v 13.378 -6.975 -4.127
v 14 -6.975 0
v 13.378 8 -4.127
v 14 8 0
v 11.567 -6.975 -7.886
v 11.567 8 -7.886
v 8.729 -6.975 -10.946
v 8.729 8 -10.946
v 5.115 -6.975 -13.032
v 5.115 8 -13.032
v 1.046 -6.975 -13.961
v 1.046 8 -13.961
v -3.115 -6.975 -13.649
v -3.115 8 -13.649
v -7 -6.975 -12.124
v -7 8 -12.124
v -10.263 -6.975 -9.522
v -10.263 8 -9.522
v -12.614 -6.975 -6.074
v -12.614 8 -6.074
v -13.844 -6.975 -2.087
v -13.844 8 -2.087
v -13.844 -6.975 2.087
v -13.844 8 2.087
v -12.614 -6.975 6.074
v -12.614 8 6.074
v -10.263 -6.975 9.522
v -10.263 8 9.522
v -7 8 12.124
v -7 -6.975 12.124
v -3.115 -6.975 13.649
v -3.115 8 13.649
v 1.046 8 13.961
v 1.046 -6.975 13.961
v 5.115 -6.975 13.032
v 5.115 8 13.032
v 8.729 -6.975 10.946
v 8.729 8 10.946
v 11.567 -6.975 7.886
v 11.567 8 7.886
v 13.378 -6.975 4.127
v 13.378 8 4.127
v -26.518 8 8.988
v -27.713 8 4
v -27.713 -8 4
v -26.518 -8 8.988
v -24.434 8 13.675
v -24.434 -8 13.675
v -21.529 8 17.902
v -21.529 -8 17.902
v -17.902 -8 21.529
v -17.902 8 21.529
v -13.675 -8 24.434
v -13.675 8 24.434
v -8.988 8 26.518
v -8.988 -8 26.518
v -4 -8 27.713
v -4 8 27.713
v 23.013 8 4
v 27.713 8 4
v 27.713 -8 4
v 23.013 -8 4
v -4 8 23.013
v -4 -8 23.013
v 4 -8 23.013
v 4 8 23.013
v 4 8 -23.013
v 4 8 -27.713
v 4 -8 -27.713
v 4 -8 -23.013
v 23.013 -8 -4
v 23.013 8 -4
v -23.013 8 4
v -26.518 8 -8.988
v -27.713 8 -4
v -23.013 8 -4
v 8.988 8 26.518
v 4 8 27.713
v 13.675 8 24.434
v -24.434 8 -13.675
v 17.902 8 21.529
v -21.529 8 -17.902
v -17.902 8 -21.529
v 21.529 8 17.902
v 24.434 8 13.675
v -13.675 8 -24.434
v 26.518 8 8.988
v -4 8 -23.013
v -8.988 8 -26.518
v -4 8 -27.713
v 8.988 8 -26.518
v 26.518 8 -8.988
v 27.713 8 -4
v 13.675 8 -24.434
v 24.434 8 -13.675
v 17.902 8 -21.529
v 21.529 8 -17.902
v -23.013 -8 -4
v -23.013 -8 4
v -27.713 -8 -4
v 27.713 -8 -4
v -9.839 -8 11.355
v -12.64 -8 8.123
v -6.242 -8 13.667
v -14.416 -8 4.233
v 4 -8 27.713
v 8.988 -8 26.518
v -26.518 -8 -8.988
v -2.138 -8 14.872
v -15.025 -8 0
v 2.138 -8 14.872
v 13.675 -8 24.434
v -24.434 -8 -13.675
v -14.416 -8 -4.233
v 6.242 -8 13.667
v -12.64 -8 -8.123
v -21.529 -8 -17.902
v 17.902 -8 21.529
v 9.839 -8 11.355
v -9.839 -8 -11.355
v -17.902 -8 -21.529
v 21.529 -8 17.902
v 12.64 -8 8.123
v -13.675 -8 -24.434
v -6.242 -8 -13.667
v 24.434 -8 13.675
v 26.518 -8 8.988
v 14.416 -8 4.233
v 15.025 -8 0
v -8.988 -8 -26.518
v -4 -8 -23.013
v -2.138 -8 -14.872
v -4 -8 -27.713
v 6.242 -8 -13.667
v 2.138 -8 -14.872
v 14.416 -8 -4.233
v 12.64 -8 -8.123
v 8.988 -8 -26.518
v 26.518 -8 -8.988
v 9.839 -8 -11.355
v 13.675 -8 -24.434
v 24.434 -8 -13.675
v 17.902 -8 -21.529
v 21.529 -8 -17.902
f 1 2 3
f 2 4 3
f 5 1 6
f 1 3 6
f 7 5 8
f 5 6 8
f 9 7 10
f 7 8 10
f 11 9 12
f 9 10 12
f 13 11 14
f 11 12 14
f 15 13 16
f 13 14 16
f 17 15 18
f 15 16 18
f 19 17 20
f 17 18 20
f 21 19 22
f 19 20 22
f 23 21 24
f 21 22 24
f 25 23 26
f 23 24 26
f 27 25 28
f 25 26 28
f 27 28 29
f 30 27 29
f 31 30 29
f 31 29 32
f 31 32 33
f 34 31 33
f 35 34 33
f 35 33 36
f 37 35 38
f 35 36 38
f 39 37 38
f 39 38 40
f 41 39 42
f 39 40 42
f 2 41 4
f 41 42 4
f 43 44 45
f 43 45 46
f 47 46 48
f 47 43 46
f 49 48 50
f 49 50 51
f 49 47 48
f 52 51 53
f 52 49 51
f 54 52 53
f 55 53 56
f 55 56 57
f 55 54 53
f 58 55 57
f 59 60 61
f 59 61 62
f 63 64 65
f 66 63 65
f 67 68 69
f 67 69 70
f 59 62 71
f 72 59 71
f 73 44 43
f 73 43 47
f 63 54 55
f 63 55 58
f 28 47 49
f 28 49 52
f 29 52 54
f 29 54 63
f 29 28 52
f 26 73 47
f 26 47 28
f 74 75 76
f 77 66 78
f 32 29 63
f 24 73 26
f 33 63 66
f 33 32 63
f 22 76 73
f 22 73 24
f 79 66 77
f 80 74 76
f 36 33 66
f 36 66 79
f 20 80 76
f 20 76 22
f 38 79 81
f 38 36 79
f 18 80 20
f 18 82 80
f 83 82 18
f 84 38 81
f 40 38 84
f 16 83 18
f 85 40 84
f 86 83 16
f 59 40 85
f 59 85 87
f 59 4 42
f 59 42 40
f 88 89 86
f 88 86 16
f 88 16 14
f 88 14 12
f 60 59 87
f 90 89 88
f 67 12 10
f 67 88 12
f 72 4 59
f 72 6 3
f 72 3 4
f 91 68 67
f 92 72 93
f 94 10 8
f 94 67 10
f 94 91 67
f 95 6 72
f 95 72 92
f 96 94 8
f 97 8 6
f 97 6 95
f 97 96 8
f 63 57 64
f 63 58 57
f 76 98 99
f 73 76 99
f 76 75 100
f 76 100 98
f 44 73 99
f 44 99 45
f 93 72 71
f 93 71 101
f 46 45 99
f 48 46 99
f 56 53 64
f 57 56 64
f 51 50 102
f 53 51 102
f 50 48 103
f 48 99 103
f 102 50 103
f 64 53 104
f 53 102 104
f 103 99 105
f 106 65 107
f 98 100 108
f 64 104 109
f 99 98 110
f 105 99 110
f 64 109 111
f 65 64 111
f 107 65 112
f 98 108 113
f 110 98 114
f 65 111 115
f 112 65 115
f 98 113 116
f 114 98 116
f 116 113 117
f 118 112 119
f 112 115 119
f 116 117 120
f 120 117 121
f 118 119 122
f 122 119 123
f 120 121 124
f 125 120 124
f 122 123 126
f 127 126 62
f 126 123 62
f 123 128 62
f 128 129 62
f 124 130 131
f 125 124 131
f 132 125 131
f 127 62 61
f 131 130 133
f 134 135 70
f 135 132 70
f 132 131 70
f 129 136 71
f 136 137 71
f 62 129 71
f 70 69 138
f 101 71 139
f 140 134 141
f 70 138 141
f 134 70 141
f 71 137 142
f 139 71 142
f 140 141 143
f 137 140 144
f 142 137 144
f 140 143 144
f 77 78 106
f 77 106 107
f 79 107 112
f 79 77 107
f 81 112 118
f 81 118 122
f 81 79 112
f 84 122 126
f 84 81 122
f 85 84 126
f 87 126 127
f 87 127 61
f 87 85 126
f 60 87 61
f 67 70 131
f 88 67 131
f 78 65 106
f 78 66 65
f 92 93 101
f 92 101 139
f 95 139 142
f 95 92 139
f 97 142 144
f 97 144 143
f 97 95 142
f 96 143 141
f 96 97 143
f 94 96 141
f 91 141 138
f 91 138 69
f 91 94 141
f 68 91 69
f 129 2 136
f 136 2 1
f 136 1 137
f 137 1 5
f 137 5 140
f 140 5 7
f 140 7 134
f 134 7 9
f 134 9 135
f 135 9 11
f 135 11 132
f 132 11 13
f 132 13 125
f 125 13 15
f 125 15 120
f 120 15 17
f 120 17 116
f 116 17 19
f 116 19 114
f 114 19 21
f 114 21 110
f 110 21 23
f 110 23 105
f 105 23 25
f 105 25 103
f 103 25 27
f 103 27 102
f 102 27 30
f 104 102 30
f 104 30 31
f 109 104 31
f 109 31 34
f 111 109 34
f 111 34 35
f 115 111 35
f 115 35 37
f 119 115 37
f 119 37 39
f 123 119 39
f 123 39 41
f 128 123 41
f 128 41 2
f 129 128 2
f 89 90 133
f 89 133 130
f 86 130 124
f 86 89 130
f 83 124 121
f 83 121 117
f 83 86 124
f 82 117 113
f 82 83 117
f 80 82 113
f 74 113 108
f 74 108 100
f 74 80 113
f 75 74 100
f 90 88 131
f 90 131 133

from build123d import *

# Parameters (mm, degrees)
BOSS_EXTRUDE1_DEPTH              = 8
M30X2_0_TAPPED_HOLE5_D           = 28
M30X2_0_TAPPED_HOLE5_DEPTH       = 16
M30X2_0_TAPPED_HOLE5_CSINK_D     = 30.05
M30X2_0_TAPPED_HOLE5_CSINK_ANGLE = 90
M30X2_0_TAPPED_HOLE5_TIP         = 8.412048666


with BuildPart() as part:
    # Sketch1 → Boss-Extrude1 (new, symmetric)
    with BuildSketch(Plane(origin=(0, 0, 0), x_dir=(1, 0, 0), z_dir=(0, 1, 0))):
        with BuildLine():
            Line((4, -23.012812921), (4, -27.712812921))
            ThreePointArc((4, -27.712812921), (19.798989873, -19.798989873), (27.712812921, -4))
            Line((27.712812921, -4), (23.012812921, -4))
            Line((23.012812921, -4), (23.012812921, 4))
            Line((23.012812921, 4), (27.712812921, 4))
            ThreePointArc((27.712812921, 4), (19.798989873, 19.798989873), (4, 27.712812921))
            Line((4, 27.712812921), (4, 23.012812921))
            Line((4, 23.012812921), (-4, 23.012812921))
            Line((-4, 23.012812921), (-4, 27.712812921))
            ThreePointArc((-4, 27.712812921), (-19.798989873, 19.798989873), (-27.712812921, 4))
            Line((-27.712812921, 4), (-23.012812921, 4))
            Line((-23.012812921, 4), (-23.012812921, -4))
            Line((-23.012812921, -4), (-27.712812921, -4))
            ThreePointArc((-27.712812921, -4), (-19.798989873, -19.798989873), (-4, -27.712812921))
            Line((-4, -27.712812921), (-4, -23.012812921))
            Line((-4, -23.012812921), (4, -23.012812921))
        make_face()
    extrude(amount=BOSS_EXTRUDE1_DEPTH, both=True)

    # M30x2.0 Tapped Hole5
    with Locations(Plane(origin=(0, -8, 0), x_dir=(-1, 0, 0), z_dir=(0, -1, 0))):
        with Locations((0, 0)):
            CounterSinkHole(M30X2_0_TAPPED_HOLE5_D / 2, M30X2_0_TAPPED_HOLE5_CSINK_D / 2, depth=M30X2_0_TAPPED_HOLE5_DEPTH, counter_sink_angle=M30X2_0_TAPPED_HOLE5_CSINK_ANGLE)
            with Locations((0, 0, -(M30X2_0_TAPPED_HOLE5_DEPTH + M30X2_0_TAPPED_HOLE5_TIP / 2))):  # 118° drill point
                Cone(0, M30X2_0_TAPPED_HOLE5_D / 2, M30X2_0_TAPPED_HOLE5_TIP, mode=Mode.SUBTRACT)


solid = part.part
